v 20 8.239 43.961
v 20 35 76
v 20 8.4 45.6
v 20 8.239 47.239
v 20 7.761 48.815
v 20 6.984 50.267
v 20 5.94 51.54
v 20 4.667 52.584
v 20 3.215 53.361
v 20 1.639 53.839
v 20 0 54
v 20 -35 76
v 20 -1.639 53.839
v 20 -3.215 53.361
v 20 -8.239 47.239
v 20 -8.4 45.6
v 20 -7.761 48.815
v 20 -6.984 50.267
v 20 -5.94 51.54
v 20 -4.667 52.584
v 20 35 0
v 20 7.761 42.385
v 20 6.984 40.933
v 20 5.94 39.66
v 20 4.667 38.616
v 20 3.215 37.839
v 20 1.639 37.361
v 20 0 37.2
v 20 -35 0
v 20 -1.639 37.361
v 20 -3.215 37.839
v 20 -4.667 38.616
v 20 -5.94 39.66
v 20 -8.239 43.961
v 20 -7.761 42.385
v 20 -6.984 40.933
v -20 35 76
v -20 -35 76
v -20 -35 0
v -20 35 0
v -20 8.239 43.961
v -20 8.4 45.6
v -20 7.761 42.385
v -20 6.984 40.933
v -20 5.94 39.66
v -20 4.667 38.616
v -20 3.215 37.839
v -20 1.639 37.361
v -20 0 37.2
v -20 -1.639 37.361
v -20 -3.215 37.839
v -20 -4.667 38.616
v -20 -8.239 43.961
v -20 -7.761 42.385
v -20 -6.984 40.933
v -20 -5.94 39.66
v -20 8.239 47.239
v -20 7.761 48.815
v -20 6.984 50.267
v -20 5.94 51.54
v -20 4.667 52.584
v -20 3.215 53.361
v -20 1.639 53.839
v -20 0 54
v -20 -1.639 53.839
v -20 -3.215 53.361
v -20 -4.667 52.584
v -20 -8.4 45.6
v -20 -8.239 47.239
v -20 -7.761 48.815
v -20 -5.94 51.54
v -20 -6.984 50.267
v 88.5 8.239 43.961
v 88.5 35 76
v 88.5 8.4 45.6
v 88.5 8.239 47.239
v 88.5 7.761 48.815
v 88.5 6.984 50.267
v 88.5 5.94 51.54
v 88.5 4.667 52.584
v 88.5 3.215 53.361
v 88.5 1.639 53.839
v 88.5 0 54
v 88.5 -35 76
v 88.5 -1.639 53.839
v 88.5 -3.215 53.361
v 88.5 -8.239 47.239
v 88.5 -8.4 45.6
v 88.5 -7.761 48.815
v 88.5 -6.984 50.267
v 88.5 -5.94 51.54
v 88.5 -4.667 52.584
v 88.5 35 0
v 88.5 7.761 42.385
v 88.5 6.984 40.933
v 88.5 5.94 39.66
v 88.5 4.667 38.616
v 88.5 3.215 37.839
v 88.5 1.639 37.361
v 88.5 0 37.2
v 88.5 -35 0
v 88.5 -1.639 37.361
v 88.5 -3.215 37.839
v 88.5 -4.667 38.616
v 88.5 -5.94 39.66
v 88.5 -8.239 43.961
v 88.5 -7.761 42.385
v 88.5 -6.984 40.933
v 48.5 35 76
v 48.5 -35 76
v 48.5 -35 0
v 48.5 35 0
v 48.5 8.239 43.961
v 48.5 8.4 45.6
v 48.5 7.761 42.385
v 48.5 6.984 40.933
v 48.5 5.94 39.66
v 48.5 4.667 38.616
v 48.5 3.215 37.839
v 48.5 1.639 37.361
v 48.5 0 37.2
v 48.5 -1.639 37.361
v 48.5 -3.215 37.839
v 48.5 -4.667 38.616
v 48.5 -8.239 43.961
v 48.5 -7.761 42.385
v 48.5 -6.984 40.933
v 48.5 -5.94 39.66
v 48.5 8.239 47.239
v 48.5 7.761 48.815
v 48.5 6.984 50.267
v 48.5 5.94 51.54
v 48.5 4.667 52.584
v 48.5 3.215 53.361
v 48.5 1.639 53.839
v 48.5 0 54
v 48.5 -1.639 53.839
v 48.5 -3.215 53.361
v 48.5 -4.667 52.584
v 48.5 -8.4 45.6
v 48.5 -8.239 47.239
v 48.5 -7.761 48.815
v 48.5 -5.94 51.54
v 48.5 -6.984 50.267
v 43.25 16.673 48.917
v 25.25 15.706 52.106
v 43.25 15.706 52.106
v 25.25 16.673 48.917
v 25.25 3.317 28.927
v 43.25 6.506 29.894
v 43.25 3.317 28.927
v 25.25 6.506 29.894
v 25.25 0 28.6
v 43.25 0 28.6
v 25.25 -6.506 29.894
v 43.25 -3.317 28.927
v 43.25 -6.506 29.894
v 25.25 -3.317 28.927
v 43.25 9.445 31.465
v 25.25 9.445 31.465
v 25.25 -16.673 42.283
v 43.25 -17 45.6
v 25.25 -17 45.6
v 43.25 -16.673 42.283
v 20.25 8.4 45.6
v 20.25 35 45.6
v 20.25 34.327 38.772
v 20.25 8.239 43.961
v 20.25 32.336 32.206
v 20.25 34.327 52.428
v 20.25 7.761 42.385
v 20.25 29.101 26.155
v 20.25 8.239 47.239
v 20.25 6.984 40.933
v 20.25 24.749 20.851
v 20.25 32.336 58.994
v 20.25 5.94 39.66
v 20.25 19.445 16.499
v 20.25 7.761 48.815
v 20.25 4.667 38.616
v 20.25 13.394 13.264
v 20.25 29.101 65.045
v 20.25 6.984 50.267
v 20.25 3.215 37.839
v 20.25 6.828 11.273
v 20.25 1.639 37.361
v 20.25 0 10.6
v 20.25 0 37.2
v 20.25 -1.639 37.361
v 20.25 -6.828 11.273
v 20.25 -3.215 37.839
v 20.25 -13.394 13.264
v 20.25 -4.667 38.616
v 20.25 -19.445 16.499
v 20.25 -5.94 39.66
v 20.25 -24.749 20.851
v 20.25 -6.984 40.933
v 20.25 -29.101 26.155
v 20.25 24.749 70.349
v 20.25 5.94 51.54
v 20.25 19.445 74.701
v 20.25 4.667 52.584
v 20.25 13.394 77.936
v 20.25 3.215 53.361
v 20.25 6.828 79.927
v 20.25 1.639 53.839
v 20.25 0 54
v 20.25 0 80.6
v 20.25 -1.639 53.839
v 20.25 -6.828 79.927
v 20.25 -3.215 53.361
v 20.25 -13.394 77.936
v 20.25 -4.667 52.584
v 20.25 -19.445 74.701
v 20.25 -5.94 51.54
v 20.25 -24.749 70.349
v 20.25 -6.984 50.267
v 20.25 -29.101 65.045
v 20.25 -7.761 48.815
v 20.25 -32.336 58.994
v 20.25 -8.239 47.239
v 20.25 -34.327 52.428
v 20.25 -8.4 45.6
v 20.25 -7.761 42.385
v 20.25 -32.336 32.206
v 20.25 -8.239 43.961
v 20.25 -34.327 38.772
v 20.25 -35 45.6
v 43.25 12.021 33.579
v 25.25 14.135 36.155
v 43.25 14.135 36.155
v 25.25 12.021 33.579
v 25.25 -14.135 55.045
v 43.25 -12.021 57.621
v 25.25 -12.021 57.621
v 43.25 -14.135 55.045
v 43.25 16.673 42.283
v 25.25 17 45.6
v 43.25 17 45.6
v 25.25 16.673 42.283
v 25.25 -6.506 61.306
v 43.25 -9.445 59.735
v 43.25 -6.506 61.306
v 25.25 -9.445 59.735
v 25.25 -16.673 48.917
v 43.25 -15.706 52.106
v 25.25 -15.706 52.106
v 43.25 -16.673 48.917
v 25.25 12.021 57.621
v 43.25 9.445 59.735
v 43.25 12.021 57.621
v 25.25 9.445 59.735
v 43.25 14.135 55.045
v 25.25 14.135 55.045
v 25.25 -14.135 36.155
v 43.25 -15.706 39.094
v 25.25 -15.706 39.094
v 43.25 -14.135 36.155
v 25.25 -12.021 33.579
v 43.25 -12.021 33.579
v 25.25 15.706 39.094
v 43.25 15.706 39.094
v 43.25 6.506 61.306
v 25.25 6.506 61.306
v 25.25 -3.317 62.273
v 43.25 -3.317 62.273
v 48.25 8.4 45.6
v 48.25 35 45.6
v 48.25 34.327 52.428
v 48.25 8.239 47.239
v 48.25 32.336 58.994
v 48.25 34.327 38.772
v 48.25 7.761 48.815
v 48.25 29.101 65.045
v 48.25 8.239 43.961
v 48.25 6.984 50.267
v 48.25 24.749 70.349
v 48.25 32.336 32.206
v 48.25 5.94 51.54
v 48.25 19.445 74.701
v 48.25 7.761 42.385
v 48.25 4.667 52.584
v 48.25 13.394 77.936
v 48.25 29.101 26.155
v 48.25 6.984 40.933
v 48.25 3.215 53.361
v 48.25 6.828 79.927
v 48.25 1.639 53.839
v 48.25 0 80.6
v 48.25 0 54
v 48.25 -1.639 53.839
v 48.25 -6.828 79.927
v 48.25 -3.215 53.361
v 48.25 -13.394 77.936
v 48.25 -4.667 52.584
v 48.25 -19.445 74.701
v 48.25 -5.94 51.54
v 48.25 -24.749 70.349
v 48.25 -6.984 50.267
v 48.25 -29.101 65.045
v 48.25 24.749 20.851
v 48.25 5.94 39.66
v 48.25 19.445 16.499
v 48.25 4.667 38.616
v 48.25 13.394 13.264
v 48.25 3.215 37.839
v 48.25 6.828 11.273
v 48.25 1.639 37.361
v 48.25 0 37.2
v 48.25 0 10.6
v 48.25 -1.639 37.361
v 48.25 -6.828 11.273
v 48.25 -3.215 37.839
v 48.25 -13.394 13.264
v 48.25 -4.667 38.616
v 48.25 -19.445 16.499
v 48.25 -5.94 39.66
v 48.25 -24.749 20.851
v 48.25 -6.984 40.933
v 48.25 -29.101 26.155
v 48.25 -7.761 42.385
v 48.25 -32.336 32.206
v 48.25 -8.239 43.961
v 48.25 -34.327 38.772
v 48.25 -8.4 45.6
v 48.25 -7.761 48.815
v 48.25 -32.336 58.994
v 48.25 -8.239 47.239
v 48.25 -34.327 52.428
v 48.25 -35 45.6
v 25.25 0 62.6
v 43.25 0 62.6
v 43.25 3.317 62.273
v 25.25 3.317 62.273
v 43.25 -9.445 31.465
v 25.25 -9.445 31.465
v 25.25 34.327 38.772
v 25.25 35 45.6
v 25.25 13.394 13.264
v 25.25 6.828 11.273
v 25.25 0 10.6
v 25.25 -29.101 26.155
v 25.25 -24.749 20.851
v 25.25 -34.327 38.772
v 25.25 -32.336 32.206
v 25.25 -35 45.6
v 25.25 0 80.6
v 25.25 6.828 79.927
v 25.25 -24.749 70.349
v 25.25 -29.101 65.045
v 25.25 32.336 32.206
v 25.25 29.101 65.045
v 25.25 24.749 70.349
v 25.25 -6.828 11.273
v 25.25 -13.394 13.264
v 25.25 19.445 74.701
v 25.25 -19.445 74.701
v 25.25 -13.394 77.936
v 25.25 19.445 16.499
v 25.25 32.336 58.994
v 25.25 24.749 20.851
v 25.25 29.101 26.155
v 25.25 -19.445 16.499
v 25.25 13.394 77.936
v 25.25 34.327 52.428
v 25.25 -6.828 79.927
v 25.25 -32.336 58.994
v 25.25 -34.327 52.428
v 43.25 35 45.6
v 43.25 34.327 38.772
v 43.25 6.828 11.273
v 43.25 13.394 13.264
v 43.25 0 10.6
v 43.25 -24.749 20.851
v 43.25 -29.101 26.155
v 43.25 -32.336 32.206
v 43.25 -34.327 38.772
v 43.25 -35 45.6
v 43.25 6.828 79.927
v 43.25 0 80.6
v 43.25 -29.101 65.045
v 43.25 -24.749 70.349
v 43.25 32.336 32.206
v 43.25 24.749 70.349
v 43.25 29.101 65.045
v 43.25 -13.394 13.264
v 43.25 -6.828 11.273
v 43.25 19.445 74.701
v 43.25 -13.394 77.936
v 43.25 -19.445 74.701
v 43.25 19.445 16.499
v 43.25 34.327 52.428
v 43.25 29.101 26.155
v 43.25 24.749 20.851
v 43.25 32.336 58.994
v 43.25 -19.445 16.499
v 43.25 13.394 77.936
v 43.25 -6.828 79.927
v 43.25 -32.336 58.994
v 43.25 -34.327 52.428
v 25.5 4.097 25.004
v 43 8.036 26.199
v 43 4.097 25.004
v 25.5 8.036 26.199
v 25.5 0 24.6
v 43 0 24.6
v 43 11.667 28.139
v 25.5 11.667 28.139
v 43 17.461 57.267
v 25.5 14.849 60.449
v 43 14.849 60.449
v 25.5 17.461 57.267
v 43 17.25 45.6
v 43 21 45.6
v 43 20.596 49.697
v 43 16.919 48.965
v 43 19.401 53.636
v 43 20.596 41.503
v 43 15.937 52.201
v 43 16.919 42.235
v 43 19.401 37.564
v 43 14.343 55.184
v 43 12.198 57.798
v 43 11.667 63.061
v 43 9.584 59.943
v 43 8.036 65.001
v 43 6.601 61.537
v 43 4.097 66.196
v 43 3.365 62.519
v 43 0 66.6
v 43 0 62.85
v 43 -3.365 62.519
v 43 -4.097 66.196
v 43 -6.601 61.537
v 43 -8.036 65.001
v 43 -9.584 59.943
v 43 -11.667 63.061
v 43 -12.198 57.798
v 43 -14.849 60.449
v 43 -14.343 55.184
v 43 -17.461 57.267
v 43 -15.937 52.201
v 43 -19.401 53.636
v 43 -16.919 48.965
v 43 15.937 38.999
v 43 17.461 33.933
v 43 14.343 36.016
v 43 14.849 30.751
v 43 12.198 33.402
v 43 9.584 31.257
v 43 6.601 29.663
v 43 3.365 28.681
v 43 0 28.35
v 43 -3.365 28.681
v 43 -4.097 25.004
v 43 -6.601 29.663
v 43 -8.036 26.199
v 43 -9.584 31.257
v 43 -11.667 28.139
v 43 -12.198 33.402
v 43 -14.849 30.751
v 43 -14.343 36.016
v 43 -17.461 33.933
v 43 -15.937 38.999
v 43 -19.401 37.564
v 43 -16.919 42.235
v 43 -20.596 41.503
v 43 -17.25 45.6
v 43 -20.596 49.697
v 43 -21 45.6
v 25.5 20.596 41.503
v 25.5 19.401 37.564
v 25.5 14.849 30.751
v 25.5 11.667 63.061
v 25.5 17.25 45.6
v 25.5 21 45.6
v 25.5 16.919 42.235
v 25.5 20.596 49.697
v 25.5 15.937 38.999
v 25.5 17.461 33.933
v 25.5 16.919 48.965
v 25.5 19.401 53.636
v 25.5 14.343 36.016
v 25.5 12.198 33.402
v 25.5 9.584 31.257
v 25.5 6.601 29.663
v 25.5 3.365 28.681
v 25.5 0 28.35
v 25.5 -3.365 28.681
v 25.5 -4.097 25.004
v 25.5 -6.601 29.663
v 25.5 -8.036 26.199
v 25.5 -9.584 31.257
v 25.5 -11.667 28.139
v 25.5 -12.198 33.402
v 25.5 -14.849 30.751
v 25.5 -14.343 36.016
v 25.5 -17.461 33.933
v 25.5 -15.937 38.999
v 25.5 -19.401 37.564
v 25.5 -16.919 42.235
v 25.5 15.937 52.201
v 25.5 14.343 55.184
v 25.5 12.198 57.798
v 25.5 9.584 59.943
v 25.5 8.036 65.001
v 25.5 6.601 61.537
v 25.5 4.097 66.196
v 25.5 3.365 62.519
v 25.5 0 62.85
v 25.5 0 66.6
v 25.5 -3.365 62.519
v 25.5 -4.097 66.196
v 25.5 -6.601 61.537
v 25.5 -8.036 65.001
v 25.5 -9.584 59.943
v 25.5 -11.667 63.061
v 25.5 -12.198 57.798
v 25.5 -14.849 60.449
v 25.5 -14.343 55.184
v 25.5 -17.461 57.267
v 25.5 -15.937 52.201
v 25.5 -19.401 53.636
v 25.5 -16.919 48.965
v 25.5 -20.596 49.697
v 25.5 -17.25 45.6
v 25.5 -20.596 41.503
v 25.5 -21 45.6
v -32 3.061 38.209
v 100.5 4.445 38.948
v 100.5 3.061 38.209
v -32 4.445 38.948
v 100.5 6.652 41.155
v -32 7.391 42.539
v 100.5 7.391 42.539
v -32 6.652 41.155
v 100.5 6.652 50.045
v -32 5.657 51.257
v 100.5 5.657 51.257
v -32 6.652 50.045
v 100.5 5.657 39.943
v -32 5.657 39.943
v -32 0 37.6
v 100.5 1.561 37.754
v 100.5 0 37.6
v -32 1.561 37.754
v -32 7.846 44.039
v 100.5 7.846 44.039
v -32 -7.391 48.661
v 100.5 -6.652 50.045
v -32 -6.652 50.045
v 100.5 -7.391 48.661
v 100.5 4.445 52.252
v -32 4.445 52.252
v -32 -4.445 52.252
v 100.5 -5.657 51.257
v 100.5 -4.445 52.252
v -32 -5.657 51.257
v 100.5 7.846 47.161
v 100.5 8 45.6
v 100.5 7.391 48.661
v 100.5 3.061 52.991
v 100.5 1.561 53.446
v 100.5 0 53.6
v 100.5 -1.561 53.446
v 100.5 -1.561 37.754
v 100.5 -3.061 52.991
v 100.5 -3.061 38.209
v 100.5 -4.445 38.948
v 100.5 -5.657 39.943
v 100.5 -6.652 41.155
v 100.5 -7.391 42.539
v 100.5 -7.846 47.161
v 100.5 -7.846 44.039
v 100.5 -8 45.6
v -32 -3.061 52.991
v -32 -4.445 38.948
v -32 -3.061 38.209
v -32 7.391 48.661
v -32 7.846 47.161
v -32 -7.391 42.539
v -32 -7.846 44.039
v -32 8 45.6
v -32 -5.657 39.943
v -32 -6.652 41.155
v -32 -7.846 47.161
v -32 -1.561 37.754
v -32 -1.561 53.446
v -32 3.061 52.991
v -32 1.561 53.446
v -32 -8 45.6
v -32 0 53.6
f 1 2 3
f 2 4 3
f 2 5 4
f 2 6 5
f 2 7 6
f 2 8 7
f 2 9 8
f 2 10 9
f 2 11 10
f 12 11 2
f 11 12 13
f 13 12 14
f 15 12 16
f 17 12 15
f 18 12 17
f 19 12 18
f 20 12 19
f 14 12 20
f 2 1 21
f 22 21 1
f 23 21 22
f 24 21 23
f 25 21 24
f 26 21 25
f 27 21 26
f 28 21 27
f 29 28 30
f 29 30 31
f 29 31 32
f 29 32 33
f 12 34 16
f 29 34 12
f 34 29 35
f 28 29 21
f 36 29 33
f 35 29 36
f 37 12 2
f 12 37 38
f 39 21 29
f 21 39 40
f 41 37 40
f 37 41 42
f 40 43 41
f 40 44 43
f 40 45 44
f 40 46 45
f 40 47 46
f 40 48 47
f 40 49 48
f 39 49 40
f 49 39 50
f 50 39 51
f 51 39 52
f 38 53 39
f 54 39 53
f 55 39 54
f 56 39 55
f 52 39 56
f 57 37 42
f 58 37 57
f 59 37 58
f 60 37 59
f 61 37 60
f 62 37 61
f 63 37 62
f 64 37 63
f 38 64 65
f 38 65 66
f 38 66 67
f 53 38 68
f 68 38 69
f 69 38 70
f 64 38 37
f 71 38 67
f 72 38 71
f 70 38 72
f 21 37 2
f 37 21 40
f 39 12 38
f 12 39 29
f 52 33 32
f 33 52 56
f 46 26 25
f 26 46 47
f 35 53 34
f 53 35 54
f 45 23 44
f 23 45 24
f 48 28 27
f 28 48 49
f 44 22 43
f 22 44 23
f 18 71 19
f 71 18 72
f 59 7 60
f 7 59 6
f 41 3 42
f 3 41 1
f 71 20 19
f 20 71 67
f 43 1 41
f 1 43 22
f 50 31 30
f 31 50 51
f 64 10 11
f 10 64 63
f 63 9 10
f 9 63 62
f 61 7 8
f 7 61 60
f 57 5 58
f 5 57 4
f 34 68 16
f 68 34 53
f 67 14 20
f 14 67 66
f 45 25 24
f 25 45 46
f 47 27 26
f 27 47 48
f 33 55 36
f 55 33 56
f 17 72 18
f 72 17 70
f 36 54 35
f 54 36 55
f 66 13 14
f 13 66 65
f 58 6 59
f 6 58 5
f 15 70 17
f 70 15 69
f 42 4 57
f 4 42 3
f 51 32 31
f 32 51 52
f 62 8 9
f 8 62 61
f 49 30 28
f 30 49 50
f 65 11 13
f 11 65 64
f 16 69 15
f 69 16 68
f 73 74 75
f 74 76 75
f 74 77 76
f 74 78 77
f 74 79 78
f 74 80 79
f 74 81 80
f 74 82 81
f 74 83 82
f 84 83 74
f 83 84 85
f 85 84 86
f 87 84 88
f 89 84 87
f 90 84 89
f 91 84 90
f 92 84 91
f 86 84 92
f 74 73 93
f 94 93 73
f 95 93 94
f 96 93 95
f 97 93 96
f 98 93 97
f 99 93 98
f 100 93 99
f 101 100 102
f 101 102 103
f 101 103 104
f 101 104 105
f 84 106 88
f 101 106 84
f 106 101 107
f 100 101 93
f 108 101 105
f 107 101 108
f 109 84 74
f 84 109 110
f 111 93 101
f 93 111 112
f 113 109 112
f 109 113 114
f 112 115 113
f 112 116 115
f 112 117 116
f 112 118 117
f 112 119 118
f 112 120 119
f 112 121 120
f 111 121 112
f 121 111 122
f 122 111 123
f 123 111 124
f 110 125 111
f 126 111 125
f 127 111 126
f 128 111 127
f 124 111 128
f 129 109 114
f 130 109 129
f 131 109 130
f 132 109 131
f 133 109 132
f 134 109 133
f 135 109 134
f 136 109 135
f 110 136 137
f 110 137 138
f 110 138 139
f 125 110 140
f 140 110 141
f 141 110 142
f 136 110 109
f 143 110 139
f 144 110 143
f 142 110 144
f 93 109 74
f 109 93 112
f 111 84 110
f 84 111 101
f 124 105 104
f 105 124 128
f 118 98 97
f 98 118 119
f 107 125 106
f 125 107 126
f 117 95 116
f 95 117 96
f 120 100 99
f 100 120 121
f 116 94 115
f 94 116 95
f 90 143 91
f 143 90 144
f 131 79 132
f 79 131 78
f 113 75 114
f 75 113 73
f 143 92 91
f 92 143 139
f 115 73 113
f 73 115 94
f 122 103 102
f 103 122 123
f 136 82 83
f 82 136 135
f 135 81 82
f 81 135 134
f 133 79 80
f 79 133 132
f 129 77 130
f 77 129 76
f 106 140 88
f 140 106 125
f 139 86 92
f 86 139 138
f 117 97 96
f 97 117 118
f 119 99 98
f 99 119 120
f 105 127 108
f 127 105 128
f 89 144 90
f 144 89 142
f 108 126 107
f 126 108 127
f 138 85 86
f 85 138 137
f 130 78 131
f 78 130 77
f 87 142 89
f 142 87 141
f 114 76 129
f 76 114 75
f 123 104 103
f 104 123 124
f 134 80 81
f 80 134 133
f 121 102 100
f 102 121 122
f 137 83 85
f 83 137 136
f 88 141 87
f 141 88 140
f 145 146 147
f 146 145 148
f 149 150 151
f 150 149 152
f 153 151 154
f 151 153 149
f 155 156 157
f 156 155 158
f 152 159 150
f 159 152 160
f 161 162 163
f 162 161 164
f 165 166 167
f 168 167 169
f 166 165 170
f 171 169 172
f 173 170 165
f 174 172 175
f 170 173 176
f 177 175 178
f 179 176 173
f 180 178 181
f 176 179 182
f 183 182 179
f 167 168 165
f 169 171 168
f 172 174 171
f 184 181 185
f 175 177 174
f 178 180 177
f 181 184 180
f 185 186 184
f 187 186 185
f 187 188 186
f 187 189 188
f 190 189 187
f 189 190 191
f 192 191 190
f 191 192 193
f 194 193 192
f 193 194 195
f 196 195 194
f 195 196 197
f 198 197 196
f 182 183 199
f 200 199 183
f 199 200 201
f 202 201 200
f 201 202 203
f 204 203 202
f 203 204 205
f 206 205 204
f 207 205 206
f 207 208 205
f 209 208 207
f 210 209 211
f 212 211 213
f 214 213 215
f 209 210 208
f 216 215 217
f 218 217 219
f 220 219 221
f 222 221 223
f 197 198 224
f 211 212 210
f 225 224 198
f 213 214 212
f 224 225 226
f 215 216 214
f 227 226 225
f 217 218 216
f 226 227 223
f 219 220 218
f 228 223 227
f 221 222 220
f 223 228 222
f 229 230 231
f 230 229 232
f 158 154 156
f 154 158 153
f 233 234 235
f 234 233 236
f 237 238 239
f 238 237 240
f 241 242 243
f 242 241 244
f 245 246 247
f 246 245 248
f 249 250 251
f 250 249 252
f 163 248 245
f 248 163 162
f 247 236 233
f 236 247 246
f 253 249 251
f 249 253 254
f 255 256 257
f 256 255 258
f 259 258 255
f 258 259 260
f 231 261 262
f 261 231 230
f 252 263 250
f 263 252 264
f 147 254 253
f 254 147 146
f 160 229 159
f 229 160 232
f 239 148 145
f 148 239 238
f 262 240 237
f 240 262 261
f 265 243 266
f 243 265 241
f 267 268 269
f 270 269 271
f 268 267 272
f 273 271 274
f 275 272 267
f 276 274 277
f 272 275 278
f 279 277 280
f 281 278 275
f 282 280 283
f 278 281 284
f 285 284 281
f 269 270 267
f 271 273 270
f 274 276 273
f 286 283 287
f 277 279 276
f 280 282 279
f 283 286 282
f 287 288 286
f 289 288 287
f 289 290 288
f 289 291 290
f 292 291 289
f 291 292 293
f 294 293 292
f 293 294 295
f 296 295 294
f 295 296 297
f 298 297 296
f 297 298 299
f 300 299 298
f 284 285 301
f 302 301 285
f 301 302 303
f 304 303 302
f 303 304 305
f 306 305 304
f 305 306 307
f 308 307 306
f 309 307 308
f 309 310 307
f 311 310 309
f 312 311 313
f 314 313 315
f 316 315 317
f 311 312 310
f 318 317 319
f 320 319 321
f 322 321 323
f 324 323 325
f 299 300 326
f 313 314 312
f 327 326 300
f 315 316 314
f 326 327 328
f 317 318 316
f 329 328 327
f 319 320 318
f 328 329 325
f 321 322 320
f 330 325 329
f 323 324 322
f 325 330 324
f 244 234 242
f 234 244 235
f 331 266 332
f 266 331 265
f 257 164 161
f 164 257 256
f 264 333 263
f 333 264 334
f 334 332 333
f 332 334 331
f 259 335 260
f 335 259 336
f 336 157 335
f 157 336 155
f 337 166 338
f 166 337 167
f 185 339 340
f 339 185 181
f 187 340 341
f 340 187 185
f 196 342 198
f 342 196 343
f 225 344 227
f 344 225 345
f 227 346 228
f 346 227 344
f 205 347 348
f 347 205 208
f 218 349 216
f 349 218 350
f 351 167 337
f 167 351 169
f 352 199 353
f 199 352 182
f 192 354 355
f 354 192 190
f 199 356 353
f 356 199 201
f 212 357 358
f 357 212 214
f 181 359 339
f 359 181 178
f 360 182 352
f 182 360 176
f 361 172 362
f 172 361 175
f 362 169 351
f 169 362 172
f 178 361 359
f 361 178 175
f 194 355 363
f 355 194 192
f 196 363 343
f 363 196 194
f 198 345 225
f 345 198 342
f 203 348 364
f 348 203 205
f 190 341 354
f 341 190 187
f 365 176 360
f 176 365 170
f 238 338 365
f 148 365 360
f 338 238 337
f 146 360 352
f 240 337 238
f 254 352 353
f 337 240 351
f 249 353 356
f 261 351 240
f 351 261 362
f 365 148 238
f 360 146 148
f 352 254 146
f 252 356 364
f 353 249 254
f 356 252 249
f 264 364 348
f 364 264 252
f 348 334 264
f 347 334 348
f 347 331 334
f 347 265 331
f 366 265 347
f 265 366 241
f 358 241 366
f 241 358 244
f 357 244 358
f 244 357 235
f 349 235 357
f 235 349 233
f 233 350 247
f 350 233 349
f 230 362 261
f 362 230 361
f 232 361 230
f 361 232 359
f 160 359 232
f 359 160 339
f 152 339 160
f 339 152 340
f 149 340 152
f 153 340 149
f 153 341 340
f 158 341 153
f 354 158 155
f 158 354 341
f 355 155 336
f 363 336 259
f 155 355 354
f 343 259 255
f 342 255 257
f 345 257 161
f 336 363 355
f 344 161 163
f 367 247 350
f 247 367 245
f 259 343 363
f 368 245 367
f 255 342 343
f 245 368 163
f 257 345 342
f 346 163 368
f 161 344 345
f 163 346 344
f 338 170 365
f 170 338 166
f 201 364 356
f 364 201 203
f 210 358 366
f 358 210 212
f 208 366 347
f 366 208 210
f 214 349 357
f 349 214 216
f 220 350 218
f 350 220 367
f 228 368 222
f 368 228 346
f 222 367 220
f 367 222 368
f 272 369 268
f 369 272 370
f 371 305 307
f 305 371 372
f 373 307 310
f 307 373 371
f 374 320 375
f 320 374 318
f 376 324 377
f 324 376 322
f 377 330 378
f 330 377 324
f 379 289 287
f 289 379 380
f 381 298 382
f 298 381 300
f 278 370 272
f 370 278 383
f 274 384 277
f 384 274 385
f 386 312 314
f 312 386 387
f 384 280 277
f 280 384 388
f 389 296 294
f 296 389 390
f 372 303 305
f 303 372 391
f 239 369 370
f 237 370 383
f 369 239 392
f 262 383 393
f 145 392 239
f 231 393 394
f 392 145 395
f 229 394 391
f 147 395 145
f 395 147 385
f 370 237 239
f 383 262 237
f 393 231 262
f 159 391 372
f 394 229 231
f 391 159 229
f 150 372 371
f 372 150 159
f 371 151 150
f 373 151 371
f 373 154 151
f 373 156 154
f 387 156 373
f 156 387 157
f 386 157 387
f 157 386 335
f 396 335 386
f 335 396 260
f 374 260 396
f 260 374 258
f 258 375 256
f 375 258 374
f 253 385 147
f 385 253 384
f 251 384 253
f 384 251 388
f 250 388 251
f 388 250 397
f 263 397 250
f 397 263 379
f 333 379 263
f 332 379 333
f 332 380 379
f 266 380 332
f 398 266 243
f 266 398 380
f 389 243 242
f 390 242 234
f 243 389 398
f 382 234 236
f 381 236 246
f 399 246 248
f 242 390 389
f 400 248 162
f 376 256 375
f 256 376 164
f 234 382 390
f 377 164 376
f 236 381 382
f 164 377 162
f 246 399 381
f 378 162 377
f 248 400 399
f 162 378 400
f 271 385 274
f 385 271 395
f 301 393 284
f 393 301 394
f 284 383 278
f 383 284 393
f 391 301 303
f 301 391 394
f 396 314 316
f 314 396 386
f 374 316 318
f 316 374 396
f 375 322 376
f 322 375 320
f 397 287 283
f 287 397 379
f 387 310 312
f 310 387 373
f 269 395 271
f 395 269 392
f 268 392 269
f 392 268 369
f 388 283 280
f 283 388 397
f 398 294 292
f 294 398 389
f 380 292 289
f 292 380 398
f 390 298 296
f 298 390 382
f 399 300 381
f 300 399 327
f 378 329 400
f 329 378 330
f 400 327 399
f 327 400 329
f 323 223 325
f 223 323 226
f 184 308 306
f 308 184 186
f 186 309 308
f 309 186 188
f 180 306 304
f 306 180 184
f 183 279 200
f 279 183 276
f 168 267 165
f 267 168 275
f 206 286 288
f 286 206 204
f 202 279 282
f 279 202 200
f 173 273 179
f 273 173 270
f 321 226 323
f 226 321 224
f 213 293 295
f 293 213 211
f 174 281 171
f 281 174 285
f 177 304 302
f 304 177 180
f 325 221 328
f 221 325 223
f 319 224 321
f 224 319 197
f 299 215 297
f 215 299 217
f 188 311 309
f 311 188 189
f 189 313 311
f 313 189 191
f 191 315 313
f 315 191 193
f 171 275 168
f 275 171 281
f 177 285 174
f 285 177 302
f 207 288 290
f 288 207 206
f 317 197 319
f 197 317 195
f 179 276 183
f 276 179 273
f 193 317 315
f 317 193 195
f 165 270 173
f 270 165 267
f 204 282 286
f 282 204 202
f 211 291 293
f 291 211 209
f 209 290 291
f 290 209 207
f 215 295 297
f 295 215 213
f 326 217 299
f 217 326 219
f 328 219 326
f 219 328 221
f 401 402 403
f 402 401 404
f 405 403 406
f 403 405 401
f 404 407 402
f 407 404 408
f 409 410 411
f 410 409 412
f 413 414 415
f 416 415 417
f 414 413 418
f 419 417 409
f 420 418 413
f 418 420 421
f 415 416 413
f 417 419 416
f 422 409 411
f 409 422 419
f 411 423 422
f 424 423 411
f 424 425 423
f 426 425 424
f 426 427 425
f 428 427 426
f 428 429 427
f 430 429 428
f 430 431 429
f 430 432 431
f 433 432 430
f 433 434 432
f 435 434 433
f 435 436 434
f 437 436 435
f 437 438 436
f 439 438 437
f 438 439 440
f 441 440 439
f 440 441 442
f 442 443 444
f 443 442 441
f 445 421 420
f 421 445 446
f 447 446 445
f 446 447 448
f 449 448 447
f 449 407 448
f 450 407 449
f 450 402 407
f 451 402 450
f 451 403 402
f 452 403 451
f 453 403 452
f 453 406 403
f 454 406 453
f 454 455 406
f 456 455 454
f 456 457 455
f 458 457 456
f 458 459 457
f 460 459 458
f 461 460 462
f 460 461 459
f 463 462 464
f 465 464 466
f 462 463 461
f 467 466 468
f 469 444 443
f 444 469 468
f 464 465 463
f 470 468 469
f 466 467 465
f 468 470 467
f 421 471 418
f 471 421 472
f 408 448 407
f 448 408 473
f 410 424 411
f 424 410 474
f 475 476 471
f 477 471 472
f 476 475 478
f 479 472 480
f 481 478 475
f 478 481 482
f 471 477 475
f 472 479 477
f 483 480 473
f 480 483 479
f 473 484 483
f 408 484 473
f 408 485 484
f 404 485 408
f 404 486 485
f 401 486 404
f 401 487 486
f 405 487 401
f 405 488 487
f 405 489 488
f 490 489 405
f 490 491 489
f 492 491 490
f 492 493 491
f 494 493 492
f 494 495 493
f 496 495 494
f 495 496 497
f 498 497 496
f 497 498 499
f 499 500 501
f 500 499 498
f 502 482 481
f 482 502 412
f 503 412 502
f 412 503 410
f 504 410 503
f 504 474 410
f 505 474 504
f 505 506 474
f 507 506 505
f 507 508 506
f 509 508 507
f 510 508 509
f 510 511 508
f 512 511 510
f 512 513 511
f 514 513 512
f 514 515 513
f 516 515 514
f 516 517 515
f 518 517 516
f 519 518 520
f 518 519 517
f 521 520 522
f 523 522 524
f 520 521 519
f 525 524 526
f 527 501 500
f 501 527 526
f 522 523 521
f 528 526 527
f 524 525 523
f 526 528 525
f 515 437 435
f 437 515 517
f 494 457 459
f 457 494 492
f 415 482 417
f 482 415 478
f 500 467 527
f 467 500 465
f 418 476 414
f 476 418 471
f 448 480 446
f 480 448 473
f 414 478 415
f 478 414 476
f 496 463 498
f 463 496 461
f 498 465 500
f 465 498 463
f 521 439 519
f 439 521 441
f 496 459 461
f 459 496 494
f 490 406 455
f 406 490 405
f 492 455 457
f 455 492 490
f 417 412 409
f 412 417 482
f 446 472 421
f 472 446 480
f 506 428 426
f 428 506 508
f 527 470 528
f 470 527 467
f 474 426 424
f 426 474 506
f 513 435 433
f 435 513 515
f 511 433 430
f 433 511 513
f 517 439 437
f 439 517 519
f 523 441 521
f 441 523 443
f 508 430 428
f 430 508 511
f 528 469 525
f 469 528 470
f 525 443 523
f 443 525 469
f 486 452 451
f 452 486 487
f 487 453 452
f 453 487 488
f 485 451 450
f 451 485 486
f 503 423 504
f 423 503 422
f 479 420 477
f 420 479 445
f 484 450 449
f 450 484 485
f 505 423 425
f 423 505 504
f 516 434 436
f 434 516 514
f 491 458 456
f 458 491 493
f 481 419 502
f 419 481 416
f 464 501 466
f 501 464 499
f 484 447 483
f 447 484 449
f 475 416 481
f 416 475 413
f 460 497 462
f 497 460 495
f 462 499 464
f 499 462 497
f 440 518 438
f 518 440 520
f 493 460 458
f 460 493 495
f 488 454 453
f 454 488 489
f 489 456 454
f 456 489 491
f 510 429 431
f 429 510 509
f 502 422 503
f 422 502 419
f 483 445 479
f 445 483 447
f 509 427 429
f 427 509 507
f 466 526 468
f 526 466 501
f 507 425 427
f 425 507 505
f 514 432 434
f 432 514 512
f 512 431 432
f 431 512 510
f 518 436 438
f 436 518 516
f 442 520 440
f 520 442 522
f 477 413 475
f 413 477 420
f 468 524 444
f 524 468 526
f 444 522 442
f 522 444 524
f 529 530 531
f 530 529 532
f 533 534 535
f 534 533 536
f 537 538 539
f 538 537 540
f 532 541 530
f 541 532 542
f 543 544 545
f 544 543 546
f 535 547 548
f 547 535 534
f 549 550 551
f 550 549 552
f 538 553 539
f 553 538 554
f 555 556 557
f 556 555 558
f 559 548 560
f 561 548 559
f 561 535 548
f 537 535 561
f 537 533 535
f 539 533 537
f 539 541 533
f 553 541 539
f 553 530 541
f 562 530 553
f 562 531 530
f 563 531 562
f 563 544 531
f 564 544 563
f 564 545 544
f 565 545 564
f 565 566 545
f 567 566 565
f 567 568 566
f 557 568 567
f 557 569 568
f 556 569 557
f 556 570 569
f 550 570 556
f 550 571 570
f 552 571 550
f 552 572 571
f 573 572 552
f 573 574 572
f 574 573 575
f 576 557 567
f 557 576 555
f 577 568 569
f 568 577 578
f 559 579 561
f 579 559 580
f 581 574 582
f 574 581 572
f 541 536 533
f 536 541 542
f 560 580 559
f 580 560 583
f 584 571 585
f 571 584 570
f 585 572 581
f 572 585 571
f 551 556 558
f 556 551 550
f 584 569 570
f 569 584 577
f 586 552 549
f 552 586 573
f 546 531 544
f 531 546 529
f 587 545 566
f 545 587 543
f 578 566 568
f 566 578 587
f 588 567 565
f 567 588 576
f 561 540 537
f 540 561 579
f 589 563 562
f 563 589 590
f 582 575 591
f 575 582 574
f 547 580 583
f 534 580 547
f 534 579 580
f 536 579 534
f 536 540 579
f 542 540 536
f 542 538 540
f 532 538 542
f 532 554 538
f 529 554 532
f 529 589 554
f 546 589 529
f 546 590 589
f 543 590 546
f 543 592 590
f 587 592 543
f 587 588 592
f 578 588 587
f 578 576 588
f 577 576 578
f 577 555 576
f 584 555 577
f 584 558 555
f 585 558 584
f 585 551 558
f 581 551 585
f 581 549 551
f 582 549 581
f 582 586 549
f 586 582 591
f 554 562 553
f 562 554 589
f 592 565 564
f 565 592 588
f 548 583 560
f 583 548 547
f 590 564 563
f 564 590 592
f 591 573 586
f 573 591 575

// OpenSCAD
$fn = 32;

// ------------------------------------------------------------------------
// Pulley assembly: d70 pulley with a belt, shaft d16
// Every part is its own module, assembly() places them once.
// ------------------------------------------------------------------------

// --- part 1 ---
module support1() {
  difference() {
    translate([-20, -35, 0]) cube([40, 70, 76]);
    translate([0, 0, 45.6]) rotate([0, 90, 0]) cylinder(h = 42, d = 16.8, center = true);
  }
}

// --- part 2 ---
module support2() {
  difference() {
    translate([-20, -35, 0]) cube([40, 70, 76]);
    translate([0, 0, 45.6]) rotate([0, 90, 0]) cylinder(h = 42, d = 16.8, center = true);
  }
}

// --- part 3 ---
module shaft() {
  translate([0, 0, -66.25]) cylinder(h = 132.5, d = 16);
}

// --- part 4 ---
module pulley() {
  difference() {
    union() {
      cylinder(h = 28, d = 34);
      cylinder(h = 5, d = 70);
      translate([0, 0, 23]) cylinder(h = 5, d = 70);
    }
    translate([0, 0, -1]) cylinder(h = 30, d = 16.8);
  }
}

// --- part 5 ---
module belt() {
  difference() {
      translate([0, 0, 0]) cylinder(h = 17.5, d = 42);
      translate([0, 0, -1]) cylinder(h = 19.5, d = 34.5);
    }
}

// --- assembly ---
module assembly() {
  translate([0, 0, 0]) rotate([0, 0, 0]) support1();
  translate([68.5, 0, 0]) rotate([0, 0, 0]) support2();
  translate([34.25, 0, 45.6]) rotate([0, 90, 0]) shaft();
  translate([20.25, 0, 45.6]) rotate([0, 90, 0]) pulley();
  translate([25.5, 0, 45.6]) rotate([0, 90, 0]) belt();
}

assembly();
